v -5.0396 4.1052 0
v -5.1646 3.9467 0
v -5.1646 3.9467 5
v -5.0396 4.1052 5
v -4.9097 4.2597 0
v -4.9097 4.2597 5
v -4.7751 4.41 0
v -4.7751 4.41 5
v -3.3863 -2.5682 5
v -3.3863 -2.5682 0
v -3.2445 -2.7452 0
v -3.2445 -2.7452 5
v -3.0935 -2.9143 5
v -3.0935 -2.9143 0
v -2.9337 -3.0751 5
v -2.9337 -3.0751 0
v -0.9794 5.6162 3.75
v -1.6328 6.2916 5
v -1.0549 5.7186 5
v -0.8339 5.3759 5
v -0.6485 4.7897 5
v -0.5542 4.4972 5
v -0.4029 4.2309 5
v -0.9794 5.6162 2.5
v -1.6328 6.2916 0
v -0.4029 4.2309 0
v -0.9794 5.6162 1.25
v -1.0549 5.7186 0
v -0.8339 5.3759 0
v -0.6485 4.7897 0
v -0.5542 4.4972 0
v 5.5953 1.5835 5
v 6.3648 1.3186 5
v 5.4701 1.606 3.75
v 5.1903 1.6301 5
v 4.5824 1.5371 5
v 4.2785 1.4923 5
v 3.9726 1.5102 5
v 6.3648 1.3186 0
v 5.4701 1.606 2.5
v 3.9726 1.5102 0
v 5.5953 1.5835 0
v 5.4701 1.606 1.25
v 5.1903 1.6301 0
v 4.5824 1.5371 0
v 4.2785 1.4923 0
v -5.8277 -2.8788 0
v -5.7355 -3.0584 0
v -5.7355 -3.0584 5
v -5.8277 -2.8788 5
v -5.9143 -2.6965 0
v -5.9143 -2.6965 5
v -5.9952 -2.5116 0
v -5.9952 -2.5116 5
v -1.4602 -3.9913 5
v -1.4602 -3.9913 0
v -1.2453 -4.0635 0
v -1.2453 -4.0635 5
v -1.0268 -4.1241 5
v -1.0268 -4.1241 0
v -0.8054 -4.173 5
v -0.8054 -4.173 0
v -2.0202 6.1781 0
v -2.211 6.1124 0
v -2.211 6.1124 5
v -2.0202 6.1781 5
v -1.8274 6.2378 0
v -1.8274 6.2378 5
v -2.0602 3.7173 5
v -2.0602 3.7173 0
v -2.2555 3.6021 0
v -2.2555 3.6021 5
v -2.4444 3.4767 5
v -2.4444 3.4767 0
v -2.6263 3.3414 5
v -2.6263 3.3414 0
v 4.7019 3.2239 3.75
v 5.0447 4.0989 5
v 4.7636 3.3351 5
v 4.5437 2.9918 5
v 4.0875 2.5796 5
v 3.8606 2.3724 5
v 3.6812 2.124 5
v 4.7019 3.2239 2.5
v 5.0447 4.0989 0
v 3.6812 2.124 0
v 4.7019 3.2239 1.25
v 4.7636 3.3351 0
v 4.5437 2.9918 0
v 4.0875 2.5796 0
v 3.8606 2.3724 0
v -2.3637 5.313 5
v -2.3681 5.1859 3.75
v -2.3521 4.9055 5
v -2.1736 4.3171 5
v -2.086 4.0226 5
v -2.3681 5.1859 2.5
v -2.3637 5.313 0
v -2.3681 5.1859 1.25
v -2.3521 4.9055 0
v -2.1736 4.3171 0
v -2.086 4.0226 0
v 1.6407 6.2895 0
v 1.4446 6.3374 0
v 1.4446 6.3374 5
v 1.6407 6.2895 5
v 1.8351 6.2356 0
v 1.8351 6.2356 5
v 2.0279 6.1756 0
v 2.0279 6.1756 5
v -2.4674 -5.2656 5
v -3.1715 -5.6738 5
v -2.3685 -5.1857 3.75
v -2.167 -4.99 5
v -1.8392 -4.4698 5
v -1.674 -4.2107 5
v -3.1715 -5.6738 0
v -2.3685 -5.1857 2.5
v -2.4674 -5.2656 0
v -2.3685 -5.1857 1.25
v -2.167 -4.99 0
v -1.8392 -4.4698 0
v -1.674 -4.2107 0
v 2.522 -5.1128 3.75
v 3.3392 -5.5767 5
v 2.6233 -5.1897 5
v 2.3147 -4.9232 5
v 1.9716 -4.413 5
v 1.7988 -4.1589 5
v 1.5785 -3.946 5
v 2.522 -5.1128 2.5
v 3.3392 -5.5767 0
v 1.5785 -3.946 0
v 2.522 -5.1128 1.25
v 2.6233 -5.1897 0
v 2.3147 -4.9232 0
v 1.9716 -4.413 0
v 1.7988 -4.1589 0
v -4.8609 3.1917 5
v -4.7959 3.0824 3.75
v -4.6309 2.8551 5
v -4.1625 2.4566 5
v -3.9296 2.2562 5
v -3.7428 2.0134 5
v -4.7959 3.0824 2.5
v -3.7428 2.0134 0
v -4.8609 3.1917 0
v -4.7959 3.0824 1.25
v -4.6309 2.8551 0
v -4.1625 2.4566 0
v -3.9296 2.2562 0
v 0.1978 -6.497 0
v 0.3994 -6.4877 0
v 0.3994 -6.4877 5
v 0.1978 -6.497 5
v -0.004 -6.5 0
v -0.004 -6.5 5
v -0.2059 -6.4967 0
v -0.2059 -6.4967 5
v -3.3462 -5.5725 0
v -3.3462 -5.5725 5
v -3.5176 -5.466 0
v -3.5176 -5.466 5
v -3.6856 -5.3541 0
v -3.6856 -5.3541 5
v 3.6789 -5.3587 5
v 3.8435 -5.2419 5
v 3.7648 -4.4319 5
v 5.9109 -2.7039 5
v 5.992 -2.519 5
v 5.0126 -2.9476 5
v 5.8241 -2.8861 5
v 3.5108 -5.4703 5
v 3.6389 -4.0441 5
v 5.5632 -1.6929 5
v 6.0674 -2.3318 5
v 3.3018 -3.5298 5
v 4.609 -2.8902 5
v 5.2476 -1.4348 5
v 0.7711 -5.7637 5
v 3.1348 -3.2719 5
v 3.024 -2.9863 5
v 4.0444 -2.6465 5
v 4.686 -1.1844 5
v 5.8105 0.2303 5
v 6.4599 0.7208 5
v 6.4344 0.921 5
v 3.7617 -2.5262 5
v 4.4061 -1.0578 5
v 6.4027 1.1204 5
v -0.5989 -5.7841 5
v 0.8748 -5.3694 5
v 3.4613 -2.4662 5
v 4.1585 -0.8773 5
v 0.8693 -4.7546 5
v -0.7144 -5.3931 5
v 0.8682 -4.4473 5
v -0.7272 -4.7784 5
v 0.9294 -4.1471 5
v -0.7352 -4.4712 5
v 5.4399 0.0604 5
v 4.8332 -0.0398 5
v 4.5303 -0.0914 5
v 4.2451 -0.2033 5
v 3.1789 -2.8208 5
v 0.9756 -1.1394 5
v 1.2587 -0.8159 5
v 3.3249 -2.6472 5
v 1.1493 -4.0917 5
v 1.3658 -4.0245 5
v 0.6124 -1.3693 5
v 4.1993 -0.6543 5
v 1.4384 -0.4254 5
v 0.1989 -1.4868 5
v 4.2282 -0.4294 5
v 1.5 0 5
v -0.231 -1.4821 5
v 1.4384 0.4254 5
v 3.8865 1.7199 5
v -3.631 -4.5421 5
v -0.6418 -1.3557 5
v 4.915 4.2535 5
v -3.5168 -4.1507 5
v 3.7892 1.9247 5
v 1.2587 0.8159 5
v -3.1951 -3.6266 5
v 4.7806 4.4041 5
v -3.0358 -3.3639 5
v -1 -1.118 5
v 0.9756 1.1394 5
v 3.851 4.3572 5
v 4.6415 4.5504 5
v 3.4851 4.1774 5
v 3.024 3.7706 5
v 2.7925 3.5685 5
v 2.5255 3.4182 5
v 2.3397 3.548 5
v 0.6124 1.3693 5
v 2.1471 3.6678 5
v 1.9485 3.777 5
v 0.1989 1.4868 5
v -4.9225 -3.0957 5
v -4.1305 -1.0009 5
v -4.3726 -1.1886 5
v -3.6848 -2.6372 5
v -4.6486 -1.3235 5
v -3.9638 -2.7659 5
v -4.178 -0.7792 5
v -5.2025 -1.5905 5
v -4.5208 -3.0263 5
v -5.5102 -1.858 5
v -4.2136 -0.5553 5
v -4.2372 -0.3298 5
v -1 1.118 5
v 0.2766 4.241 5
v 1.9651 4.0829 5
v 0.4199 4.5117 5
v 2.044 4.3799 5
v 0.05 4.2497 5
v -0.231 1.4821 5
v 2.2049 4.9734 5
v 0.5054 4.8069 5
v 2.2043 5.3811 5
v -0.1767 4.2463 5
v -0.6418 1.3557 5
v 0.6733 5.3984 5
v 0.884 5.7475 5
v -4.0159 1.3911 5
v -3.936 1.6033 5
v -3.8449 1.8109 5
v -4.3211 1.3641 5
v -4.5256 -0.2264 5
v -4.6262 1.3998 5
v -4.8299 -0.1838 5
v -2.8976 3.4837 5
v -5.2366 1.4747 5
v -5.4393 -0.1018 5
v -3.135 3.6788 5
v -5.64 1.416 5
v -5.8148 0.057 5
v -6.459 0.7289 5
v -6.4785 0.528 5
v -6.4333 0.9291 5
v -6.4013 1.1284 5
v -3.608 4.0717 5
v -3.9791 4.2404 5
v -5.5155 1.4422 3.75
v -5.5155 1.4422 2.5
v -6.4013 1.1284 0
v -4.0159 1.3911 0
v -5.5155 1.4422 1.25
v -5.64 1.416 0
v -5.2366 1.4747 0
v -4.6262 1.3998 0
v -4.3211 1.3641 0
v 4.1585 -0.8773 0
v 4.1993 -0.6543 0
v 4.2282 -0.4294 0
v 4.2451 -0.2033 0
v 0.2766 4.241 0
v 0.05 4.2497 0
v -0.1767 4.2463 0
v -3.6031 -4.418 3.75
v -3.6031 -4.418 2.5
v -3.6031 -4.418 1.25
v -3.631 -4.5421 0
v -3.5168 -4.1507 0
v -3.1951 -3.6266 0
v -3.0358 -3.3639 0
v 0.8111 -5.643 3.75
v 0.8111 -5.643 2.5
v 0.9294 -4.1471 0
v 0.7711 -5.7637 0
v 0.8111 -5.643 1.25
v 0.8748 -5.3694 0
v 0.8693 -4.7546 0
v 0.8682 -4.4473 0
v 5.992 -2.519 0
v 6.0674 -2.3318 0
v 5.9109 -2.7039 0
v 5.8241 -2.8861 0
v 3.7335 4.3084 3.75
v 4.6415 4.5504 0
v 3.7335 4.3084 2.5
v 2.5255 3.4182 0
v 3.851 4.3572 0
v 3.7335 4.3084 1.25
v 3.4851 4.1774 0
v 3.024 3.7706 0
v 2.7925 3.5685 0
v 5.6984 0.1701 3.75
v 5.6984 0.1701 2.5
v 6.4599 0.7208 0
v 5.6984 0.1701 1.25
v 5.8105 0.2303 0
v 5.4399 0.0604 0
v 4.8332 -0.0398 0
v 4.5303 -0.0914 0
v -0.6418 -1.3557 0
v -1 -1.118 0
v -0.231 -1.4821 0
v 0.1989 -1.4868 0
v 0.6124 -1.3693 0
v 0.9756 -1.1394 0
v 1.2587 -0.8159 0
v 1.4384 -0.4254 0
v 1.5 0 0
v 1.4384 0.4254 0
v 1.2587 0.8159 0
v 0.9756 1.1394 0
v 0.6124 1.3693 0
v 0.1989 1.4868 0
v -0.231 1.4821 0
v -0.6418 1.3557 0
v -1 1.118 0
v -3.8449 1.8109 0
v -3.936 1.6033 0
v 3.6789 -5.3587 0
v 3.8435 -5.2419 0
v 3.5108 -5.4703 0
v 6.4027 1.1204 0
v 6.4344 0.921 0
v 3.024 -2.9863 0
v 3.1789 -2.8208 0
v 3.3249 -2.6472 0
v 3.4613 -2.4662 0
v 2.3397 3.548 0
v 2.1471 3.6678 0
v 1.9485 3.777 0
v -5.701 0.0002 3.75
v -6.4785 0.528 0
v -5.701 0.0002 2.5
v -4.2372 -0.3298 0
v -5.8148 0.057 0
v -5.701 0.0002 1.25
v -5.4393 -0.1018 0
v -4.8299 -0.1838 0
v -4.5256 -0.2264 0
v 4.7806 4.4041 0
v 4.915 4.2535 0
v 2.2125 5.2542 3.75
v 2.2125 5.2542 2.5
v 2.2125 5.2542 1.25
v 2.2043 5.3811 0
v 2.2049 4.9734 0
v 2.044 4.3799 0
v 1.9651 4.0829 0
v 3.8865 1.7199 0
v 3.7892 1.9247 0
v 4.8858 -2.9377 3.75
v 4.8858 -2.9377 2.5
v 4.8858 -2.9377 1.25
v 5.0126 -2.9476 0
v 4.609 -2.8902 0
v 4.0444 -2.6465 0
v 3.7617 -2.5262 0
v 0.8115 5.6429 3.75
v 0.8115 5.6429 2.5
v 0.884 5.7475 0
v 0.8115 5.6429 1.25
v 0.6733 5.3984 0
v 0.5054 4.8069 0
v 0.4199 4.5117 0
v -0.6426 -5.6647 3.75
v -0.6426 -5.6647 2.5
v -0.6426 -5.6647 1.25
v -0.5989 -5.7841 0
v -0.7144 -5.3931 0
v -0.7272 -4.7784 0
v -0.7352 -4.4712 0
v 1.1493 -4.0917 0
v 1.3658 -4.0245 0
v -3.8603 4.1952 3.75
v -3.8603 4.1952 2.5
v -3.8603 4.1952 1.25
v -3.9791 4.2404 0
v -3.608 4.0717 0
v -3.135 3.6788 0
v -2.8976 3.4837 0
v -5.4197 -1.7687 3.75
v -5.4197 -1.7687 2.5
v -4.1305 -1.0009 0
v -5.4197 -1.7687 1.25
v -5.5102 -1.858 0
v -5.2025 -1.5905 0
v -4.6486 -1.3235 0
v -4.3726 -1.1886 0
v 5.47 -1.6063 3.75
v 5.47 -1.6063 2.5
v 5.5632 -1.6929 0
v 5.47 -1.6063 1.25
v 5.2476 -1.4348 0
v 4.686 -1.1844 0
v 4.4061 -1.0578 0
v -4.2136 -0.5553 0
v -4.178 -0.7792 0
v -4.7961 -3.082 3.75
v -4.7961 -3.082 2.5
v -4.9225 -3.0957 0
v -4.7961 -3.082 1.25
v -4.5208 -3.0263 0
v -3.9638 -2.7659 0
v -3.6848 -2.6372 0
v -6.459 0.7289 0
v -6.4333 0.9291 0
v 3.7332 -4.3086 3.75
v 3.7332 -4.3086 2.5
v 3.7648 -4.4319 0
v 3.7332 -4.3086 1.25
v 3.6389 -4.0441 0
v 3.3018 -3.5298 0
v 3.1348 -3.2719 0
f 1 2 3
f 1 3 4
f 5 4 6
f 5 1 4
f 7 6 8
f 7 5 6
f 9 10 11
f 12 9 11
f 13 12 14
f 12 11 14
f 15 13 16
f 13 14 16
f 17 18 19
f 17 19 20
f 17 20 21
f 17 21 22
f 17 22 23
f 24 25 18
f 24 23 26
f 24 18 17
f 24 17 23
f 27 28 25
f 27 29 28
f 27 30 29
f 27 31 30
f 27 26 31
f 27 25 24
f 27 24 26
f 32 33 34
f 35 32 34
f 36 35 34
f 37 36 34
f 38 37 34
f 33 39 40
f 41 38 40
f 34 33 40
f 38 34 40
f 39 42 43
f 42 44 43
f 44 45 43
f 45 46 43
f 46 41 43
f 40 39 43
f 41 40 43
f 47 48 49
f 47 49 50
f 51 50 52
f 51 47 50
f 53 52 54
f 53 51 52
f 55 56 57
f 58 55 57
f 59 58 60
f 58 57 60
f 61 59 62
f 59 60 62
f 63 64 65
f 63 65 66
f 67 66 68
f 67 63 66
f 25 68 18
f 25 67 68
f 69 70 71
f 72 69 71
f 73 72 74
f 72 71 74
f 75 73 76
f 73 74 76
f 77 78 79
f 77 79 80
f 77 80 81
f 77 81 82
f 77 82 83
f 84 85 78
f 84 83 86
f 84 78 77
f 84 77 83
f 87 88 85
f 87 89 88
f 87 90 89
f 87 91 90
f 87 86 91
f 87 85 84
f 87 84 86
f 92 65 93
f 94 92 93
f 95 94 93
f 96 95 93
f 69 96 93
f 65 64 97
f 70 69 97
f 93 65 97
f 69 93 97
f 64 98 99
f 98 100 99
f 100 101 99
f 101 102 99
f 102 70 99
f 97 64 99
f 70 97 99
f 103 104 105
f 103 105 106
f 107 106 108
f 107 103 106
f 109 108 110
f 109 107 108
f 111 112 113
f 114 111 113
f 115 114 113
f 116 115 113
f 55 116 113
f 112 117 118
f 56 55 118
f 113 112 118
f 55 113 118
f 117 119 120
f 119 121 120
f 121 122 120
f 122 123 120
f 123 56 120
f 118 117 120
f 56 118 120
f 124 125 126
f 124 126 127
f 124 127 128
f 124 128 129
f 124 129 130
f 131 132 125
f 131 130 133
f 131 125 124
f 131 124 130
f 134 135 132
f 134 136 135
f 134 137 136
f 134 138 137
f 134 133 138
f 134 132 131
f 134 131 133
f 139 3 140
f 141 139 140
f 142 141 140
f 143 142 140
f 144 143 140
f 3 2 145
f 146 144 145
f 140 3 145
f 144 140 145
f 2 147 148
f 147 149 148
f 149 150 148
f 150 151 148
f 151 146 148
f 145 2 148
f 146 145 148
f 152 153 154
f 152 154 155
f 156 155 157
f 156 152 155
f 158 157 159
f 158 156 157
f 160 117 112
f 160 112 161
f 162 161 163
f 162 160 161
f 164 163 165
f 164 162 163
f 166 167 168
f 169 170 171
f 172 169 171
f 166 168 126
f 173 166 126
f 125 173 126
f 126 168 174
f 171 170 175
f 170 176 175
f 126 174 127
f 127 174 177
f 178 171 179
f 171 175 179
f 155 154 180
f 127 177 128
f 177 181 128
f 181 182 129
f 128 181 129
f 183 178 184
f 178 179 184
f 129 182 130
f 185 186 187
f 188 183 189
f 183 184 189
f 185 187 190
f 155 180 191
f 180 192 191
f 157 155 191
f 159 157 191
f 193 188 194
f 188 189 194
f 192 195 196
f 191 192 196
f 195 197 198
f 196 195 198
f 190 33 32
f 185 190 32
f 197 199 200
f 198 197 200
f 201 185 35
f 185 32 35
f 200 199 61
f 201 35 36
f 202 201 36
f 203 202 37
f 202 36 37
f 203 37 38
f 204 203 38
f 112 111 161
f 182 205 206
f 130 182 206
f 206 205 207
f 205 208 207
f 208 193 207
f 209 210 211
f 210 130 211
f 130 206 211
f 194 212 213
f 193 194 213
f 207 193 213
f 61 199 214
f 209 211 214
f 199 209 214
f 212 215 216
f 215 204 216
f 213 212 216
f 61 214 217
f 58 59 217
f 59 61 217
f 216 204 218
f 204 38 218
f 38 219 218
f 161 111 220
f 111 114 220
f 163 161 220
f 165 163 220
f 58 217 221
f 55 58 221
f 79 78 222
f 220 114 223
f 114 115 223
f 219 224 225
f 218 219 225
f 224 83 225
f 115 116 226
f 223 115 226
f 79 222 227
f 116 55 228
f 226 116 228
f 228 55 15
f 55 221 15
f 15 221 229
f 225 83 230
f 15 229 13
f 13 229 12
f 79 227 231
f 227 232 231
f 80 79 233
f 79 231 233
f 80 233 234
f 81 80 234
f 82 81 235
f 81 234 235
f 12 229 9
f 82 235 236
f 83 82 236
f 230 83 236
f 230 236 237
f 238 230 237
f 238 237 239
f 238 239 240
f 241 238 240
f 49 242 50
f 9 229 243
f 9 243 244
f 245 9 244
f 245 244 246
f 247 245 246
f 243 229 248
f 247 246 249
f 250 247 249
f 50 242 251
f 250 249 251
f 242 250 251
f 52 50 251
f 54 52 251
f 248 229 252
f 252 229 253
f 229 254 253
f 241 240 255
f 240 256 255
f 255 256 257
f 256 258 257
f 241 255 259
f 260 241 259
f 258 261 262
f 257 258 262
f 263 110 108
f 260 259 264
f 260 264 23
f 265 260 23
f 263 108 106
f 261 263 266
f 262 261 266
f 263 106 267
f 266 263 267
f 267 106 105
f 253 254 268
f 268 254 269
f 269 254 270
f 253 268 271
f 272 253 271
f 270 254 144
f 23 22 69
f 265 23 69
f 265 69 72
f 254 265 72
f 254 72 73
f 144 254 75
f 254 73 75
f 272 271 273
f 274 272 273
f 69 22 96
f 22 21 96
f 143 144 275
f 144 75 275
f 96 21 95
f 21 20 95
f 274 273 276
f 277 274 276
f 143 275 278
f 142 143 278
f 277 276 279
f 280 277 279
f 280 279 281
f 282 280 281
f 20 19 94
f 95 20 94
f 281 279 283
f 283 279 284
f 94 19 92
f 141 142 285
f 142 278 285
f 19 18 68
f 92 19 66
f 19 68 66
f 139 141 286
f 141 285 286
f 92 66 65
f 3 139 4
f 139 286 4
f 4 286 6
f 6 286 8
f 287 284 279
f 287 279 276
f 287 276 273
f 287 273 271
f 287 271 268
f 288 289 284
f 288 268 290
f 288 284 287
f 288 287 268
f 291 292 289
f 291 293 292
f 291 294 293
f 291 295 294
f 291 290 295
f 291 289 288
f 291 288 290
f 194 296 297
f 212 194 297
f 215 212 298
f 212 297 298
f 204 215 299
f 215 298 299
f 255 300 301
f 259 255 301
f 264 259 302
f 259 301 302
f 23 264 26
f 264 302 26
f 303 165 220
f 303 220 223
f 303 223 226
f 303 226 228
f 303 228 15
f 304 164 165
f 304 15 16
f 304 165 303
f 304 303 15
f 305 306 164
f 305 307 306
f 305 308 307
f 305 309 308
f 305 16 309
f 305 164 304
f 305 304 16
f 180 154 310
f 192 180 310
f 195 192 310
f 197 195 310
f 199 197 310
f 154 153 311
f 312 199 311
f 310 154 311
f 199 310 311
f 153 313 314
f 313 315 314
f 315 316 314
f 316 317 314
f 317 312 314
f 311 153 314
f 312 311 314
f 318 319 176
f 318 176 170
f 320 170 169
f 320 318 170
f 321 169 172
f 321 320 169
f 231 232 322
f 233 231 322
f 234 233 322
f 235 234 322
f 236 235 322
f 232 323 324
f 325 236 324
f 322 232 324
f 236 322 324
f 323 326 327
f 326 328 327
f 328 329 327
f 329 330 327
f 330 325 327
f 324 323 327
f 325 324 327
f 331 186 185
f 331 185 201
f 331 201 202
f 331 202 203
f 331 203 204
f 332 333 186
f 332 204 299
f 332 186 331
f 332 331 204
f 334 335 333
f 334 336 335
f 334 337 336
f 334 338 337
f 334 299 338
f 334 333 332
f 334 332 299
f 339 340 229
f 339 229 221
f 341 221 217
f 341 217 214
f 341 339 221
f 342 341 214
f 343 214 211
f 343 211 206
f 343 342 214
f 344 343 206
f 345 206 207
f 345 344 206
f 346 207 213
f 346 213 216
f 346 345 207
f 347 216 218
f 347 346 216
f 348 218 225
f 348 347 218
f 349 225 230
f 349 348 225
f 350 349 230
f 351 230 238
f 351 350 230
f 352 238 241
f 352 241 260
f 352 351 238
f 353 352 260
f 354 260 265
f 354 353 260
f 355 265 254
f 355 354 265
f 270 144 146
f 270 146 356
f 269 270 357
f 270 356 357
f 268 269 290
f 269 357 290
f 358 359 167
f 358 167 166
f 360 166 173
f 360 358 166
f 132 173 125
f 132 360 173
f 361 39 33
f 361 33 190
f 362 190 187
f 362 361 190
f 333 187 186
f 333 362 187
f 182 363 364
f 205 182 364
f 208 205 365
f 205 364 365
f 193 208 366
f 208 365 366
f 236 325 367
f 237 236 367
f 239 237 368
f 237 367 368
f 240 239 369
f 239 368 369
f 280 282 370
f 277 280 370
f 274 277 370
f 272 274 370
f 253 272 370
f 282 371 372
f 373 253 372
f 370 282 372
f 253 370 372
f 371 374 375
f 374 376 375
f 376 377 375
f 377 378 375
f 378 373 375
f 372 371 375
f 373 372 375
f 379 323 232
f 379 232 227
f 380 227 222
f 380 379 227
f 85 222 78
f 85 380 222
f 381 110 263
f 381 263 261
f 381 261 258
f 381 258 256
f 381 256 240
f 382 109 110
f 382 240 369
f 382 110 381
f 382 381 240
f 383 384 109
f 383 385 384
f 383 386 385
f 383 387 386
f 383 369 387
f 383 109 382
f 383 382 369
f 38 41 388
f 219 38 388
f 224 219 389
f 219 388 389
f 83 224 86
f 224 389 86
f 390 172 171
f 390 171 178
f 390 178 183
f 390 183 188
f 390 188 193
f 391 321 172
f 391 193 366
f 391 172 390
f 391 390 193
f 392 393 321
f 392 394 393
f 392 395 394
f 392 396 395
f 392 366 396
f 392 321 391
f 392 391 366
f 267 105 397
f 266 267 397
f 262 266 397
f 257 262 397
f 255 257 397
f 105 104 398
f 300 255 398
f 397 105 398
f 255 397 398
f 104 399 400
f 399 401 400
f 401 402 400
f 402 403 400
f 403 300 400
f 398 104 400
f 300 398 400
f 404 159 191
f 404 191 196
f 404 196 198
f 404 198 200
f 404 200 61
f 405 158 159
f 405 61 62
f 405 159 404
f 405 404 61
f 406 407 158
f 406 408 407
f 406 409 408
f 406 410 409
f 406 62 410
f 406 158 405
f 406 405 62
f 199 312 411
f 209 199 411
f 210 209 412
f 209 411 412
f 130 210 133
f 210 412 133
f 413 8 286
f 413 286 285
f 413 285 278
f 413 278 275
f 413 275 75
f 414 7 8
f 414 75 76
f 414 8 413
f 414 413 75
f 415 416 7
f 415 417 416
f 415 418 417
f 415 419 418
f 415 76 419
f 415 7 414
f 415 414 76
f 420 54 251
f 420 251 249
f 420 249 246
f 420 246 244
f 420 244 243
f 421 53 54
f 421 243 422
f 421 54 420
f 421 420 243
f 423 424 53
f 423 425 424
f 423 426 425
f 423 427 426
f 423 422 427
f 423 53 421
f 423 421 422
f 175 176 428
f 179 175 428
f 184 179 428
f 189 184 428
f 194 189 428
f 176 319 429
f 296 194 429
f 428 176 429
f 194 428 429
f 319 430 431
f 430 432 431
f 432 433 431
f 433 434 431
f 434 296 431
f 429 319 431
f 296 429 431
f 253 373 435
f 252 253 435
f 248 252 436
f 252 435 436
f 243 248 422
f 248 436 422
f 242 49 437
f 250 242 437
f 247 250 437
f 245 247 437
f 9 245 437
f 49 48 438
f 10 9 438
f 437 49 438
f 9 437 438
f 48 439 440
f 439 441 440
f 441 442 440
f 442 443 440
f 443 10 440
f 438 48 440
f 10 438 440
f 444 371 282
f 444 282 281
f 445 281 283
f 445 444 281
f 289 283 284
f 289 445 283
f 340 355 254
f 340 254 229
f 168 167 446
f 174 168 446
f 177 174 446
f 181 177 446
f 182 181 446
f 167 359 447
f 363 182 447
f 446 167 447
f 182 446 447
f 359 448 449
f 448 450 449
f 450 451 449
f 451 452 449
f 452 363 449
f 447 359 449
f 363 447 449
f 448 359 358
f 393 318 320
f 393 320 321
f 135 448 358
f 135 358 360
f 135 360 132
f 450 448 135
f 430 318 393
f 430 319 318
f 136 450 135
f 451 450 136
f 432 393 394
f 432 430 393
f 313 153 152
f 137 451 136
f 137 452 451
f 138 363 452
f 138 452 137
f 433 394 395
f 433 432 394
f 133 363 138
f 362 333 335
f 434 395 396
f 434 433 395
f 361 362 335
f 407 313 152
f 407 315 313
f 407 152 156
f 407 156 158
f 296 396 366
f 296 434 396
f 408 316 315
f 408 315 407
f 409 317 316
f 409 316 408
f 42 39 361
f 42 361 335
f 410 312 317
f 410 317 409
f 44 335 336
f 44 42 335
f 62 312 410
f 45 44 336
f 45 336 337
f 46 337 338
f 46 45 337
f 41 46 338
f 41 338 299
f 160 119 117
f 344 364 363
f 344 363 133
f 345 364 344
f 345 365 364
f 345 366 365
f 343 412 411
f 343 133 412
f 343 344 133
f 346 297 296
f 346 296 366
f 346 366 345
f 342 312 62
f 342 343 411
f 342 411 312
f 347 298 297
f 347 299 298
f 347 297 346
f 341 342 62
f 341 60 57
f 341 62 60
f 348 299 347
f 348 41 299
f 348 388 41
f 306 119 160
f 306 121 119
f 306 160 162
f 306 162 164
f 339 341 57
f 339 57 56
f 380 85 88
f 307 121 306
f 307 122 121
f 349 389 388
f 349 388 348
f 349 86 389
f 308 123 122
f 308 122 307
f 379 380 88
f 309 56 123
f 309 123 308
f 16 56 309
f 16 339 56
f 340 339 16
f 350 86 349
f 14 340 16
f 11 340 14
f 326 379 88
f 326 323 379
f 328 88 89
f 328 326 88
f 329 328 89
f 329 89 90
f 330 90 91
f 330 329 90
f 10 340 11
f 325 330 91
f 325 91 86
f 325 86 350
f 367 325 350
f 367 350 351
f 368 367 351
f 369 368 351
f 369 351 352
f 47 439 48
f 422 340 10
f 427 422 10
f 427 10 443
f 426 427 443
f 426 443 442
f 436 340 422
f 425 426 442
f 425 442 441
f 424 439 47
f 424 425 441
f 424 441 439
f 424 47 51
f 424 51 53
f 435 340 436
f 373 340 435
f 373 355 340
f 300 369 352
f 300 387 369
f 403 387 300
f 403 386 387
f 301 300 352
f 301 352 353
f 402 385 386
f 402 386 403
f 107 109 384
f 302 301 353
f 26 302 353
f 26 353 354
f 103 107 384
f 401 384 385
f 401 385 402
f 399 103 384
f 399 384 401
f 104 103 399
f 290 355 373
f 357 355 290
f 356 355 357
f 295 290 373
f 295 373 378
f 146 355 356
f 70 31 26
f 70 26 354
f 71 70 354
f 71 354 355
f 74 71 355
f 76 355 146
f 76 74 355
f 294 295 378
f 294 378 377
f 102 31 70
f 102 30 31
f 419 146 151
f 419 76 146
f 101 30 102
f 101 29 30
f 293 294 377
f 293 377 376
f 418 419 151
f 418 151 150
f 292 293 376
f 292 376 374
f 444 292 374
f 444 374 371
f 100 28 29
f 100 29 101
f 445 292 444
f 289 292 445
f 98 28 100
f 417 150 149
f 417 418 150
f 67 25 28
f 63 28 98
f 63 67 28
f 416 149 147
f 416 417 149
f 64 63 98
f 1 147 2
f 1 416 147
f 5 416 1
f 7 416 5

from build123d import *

# Parameters (mm, degrees)
SKETCH_1_R               = 4.25
EXTRUDE_1_DEPTH          = 5
EXTRUDE_2_DEPTH          = 5
PATTERN_CIRCULAR_1_COUNT = 11


with BuildPart() as part:
    # 草图1 → 凸台-拉伸1 (new body)
    with BuildSketch(Plane.XY):
        Circle(SKETCH_1_R)
        with BuildLine():
            Line((-1, 1.118033989), (-1, -1.118033989))
            ThreePointArc((-1, -1.118033989), (1.5, 0), (-1, 1.118033989))
        make_face(mode=Mode.SUBTRACT)
    extrude(amount=EXTRUDE_1_DEPTH)

    # 草图2 → 凸台-拉伸2 (add)
    with BuildSketch(Plane.XY):
        with BuildLine():
            ThreePointArc((6.364840058, 1.318639842), (6.41933804, 1.020832567), (6.459909598, 0.720810648))
            add(Edge.make_bspline(
                [(6.459909598, 0.720810648), (6.30503635, 0.573432081), (6.060220687, 0.372889718), (5.705124958, 0.167850699), (5.152234448, -0.07959703), (4.606066867, 0.004749759), (4.245132436, -0.203348467)],
                knots=[0, 0, 0, 0, 0.262447939, 0.385242457, 0.502396504, 1, 1, 1, 1], degree=3))
            ThreePointArc((4.245132436, -0.203348467), (4.197259488, 0.667467448), (3.972639872, 1.510176297))
            add(Edge.make_bspline(
                [(6.364840058, 1.318639842), (6.171889239, 1.410705831), (5.87694123, 1.5254125), (5.475758403, 1.610184636), (4.873382667, 1.67391663), (4.380322357, 1.424307057), (3.972639872, 1.510176297)],
                knots=[0, 0, 0, 0, 0.262447939, 0.385242457, 0.502396504, 1, 1, 1, 1], degree=3))
        make_face()
    extrude_2 = extrude(amount=EXTRUDE_2_DEPTH)

    # 阵列(圆周)1: 凸台-拉伸2 ×11 about axis
    pattern_circular_1_axis = Axis((0, 0, 5), (0, 0, -1))
    for i in range(1, PATTERN_CIRCULAR_1_COUNT):
        add(extrude_2.rotate(pattern_circular_1_axis, i * 360 / PATTERN_CIRCULAR_1_COUNT))


solid = part.part
